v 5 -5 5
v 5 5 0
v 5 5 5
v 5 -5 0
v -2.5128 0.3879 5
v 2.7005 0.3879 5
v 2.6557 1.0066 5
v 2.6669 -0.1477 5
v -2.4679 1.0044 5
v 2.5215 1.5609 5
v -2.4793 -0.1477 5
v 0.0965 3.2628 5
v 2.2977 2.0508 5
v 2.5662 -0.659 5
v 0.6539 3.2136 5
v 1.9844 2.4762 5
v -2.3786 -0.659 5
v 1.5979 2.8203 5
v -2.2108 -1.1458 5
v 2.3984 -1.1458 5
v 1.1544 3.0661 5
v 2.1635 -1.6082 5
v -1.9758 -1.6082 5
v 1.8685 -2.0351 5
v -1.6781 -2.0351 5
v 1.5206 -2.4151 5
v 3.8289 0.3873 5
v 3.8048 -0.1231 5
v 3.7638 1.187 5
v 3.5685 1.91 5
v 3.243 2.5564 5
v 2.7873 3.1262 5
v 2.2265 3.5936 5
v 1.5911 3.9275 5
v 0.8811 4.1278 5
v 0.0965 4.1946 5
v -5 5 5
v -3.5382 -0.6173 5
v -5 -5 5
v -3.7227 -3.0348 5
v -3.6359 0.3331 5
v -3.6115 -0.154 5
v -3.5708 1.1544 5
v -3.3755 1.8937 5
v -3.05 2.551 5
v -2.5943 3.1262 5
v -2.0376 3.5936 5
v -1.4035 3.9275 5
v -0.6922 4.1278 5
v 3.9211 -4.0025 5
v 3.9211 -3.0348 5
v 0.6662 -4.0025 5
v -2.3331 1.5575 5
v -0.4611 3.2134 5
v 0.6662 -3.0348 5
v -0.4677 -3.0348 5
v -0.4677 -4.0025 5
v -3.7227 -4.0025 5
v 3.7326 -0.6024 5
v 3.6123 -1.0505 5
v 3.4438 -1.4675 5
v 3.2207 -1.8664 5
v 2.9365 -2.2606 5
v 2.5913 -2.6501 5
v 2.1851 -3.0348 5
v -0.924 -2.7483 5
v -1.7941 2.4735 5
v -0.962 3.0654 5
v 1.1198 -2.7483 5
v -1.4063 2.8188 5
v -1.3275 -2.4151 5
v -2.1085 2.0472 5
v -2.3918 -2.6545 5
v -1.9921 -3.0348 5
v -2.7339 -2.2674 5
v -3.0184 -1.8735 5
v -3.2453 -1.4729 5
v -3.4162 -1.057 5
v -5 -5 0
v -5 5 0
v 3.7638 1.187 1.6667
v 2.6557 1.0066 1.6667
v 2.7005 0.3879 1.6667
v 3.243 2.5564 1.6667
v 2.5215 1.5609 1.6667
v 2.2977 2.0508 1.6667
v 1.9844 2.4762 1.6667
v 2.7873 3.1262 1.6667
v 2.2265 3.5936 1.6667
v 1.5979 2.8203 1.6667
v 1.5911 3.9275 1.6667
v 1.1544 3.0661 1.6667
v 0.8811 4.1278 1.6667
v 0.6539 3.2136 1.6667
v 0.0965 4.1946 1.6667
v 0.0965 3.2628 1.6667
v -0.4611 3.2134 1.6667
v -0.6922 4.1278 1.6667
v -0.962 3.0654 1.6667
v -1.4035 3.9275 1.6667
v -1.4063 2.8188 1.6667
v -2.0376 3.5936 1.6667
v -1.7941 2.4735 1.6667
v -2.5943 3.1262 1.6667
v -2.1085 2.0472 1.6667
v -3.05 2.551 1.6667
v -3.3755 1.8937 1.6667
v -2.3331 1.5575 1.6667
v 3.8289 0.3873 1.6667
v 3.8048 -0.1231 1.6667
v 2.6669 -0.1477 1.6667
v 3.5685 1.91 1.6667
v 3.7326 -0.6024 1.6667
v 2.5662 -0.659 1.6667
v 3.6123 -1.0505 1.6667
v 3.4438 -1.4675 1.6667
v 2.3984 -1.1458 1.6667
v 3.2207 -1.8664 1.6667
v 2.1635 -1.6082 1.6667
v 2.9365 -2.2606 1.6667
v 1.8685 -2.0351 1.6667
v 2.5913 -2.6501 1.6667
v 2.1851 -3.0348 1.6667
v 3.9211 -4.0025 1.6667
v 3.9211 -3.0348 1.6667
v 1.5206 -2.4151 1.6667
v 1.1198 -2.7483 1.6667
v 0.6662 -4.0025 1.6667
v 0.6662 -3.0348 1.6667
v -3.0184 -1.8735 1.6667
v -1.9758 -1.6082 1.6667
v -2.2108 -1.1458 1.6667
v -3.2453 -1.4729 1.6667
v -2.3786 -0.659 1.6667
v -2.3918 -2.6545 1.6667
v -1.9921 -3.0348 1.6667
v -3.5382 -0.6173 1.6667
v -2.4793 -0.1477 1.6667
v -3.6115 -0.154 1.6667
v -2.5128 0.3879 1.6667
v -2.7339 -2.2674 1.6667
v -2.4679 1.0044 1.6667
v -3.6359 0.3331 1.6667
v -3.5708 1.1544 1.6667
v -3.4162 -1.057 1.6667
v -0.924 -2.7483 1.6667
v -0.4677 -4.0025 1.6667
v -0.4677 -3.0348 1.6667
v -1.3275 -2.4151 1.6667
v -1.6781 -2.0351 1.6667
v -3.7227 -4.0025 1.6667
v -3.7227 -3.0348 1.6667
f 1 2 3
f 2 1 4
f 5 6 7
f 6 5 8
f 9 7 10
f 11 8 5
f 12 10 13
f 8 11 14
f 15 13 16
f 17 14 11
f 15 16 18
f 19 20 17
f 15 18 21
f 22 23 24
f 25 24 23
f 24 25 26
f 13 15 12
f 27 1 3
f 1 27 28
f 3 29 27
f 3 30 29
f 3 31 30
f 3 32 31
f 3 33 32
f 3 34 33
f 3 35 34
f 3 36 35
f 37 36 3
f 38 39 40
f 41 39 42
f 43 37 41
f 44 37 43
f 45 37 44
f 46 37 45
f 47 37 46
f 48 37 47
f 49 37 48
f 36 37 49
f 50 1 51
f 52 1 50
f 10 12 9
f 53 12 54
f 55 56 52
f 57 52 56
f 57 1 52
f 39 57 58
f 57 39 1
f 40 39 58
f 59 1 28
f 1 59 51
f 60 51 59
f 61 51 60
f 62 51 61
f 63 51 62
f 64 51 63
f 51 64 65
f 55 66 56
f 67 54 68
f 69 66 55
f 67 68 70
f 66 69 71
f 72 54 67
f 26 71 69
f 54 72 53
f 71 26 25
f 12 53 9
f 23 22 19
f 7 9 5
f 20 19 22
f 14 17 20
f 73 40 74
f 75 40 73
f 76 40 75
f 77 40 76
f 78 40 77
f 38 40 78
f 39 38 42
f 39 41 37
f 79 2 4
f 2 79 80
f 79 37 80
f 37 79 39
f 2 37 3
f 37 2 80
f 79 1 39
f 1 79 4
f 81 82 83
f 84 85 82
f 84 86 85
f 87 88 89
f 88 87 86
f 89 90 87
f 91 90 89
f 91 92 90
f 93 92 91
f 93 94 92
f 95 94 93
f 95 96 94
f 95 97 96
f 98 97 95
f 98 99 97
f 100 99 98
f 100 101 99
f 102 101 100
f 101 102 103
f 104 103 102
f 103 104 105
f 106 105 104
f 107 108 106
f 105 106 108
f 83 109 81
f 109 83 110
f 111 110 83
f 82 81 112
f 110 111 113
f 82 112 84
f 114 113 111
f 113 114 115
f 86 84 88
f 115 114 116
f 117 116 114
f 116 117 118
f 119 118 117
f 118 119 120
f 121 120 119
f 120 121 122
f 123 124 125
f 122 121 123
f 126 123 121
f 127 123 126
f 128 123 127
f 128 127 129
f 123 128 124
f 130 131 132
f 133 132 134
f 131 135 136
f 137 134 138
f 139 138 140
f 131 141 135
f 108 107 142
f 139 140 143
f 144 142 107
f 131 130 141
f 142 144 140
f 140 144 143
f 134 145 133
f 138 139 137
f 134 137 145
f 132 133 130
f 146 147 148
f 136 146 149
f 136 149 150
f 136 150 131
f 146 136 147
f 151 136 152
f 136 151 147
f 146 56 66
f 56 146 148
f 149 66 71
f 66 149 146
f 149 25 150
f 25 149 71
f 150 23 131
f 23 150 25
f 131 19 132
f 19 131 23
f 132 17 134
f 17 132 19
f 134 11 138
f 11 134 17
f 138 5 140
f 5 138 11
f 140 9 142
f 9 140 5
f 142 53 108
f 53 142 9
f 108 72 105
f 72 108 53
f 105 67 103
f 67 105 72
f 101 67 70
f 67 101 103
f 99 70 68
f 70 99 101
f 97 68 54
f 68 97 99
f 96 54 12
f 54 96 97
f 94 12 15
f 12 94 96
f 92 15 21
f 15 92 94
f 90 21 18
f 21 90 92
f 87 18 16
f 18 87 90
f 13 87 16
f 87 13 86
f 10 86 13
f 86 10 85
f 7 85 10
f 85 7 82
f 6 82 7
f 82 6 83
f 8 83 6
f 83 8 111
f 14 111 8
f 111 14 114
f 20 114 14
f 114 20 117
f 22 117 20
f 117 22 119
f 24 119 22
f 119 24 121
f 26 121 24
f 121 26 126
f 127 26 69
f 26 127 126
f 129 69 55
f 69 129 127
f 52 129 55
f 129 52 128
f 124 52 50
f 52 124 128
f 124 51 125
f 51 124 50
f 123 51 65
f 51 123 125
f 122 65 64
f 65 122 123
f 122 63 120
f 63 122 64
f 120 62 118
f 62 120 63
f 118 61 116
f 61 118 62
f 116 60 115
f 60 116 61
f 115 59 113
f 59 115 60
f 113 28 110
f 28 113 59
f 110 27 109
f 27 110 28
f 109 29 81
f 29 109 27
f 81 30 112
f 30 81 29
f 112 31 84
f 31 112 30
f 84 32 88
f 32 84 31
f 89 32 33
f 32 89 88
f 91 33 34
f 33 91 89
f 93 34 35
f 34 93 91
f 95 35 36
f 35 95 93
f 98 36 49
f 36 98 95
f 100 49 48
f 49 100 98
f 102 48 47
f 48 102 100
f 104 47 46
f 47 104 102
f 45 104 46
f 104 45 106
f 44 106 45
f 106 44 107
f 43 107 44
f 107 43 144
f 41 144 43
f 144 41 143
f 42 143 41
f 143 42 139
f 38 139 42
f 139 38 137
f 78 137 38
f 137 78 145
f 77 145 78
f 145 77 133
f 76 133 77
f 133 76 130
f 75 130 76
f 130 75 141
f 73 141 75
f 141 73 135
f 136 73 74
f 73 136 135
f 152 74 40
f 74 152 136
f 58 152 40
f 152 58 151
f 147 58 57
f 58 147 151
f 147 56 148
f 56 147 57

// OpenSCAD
// Game Tokens
// Token instantiation

Token("Ω");     // enter your letter or symbol including some unicodes



// Token definition.

module Token(symbol, xpos=0) {
    difference() {
        size = 10;          // size of the Token in mm, default is 10
		symb_size = 0.8;    // scale of the symbol in relation to the token size,
							// should not be higher than 0.9
																		
        x=xpos*size;
        translate([x,0,size/4]) cube([size,size,size/2], center=true);
        translate([x,0,size/6]) {
            // convexity is needed for correct preview
            // since characters can be highly concave
            linear_extrude(height=size/2, convexity=4)
                text(symbol, 
                     size=size*(symb_size),
                     font="Bitstream Vera Sans",	// this font will be used for the symbol
                     halign="center",
                     valign="center");
        }
    }
}
